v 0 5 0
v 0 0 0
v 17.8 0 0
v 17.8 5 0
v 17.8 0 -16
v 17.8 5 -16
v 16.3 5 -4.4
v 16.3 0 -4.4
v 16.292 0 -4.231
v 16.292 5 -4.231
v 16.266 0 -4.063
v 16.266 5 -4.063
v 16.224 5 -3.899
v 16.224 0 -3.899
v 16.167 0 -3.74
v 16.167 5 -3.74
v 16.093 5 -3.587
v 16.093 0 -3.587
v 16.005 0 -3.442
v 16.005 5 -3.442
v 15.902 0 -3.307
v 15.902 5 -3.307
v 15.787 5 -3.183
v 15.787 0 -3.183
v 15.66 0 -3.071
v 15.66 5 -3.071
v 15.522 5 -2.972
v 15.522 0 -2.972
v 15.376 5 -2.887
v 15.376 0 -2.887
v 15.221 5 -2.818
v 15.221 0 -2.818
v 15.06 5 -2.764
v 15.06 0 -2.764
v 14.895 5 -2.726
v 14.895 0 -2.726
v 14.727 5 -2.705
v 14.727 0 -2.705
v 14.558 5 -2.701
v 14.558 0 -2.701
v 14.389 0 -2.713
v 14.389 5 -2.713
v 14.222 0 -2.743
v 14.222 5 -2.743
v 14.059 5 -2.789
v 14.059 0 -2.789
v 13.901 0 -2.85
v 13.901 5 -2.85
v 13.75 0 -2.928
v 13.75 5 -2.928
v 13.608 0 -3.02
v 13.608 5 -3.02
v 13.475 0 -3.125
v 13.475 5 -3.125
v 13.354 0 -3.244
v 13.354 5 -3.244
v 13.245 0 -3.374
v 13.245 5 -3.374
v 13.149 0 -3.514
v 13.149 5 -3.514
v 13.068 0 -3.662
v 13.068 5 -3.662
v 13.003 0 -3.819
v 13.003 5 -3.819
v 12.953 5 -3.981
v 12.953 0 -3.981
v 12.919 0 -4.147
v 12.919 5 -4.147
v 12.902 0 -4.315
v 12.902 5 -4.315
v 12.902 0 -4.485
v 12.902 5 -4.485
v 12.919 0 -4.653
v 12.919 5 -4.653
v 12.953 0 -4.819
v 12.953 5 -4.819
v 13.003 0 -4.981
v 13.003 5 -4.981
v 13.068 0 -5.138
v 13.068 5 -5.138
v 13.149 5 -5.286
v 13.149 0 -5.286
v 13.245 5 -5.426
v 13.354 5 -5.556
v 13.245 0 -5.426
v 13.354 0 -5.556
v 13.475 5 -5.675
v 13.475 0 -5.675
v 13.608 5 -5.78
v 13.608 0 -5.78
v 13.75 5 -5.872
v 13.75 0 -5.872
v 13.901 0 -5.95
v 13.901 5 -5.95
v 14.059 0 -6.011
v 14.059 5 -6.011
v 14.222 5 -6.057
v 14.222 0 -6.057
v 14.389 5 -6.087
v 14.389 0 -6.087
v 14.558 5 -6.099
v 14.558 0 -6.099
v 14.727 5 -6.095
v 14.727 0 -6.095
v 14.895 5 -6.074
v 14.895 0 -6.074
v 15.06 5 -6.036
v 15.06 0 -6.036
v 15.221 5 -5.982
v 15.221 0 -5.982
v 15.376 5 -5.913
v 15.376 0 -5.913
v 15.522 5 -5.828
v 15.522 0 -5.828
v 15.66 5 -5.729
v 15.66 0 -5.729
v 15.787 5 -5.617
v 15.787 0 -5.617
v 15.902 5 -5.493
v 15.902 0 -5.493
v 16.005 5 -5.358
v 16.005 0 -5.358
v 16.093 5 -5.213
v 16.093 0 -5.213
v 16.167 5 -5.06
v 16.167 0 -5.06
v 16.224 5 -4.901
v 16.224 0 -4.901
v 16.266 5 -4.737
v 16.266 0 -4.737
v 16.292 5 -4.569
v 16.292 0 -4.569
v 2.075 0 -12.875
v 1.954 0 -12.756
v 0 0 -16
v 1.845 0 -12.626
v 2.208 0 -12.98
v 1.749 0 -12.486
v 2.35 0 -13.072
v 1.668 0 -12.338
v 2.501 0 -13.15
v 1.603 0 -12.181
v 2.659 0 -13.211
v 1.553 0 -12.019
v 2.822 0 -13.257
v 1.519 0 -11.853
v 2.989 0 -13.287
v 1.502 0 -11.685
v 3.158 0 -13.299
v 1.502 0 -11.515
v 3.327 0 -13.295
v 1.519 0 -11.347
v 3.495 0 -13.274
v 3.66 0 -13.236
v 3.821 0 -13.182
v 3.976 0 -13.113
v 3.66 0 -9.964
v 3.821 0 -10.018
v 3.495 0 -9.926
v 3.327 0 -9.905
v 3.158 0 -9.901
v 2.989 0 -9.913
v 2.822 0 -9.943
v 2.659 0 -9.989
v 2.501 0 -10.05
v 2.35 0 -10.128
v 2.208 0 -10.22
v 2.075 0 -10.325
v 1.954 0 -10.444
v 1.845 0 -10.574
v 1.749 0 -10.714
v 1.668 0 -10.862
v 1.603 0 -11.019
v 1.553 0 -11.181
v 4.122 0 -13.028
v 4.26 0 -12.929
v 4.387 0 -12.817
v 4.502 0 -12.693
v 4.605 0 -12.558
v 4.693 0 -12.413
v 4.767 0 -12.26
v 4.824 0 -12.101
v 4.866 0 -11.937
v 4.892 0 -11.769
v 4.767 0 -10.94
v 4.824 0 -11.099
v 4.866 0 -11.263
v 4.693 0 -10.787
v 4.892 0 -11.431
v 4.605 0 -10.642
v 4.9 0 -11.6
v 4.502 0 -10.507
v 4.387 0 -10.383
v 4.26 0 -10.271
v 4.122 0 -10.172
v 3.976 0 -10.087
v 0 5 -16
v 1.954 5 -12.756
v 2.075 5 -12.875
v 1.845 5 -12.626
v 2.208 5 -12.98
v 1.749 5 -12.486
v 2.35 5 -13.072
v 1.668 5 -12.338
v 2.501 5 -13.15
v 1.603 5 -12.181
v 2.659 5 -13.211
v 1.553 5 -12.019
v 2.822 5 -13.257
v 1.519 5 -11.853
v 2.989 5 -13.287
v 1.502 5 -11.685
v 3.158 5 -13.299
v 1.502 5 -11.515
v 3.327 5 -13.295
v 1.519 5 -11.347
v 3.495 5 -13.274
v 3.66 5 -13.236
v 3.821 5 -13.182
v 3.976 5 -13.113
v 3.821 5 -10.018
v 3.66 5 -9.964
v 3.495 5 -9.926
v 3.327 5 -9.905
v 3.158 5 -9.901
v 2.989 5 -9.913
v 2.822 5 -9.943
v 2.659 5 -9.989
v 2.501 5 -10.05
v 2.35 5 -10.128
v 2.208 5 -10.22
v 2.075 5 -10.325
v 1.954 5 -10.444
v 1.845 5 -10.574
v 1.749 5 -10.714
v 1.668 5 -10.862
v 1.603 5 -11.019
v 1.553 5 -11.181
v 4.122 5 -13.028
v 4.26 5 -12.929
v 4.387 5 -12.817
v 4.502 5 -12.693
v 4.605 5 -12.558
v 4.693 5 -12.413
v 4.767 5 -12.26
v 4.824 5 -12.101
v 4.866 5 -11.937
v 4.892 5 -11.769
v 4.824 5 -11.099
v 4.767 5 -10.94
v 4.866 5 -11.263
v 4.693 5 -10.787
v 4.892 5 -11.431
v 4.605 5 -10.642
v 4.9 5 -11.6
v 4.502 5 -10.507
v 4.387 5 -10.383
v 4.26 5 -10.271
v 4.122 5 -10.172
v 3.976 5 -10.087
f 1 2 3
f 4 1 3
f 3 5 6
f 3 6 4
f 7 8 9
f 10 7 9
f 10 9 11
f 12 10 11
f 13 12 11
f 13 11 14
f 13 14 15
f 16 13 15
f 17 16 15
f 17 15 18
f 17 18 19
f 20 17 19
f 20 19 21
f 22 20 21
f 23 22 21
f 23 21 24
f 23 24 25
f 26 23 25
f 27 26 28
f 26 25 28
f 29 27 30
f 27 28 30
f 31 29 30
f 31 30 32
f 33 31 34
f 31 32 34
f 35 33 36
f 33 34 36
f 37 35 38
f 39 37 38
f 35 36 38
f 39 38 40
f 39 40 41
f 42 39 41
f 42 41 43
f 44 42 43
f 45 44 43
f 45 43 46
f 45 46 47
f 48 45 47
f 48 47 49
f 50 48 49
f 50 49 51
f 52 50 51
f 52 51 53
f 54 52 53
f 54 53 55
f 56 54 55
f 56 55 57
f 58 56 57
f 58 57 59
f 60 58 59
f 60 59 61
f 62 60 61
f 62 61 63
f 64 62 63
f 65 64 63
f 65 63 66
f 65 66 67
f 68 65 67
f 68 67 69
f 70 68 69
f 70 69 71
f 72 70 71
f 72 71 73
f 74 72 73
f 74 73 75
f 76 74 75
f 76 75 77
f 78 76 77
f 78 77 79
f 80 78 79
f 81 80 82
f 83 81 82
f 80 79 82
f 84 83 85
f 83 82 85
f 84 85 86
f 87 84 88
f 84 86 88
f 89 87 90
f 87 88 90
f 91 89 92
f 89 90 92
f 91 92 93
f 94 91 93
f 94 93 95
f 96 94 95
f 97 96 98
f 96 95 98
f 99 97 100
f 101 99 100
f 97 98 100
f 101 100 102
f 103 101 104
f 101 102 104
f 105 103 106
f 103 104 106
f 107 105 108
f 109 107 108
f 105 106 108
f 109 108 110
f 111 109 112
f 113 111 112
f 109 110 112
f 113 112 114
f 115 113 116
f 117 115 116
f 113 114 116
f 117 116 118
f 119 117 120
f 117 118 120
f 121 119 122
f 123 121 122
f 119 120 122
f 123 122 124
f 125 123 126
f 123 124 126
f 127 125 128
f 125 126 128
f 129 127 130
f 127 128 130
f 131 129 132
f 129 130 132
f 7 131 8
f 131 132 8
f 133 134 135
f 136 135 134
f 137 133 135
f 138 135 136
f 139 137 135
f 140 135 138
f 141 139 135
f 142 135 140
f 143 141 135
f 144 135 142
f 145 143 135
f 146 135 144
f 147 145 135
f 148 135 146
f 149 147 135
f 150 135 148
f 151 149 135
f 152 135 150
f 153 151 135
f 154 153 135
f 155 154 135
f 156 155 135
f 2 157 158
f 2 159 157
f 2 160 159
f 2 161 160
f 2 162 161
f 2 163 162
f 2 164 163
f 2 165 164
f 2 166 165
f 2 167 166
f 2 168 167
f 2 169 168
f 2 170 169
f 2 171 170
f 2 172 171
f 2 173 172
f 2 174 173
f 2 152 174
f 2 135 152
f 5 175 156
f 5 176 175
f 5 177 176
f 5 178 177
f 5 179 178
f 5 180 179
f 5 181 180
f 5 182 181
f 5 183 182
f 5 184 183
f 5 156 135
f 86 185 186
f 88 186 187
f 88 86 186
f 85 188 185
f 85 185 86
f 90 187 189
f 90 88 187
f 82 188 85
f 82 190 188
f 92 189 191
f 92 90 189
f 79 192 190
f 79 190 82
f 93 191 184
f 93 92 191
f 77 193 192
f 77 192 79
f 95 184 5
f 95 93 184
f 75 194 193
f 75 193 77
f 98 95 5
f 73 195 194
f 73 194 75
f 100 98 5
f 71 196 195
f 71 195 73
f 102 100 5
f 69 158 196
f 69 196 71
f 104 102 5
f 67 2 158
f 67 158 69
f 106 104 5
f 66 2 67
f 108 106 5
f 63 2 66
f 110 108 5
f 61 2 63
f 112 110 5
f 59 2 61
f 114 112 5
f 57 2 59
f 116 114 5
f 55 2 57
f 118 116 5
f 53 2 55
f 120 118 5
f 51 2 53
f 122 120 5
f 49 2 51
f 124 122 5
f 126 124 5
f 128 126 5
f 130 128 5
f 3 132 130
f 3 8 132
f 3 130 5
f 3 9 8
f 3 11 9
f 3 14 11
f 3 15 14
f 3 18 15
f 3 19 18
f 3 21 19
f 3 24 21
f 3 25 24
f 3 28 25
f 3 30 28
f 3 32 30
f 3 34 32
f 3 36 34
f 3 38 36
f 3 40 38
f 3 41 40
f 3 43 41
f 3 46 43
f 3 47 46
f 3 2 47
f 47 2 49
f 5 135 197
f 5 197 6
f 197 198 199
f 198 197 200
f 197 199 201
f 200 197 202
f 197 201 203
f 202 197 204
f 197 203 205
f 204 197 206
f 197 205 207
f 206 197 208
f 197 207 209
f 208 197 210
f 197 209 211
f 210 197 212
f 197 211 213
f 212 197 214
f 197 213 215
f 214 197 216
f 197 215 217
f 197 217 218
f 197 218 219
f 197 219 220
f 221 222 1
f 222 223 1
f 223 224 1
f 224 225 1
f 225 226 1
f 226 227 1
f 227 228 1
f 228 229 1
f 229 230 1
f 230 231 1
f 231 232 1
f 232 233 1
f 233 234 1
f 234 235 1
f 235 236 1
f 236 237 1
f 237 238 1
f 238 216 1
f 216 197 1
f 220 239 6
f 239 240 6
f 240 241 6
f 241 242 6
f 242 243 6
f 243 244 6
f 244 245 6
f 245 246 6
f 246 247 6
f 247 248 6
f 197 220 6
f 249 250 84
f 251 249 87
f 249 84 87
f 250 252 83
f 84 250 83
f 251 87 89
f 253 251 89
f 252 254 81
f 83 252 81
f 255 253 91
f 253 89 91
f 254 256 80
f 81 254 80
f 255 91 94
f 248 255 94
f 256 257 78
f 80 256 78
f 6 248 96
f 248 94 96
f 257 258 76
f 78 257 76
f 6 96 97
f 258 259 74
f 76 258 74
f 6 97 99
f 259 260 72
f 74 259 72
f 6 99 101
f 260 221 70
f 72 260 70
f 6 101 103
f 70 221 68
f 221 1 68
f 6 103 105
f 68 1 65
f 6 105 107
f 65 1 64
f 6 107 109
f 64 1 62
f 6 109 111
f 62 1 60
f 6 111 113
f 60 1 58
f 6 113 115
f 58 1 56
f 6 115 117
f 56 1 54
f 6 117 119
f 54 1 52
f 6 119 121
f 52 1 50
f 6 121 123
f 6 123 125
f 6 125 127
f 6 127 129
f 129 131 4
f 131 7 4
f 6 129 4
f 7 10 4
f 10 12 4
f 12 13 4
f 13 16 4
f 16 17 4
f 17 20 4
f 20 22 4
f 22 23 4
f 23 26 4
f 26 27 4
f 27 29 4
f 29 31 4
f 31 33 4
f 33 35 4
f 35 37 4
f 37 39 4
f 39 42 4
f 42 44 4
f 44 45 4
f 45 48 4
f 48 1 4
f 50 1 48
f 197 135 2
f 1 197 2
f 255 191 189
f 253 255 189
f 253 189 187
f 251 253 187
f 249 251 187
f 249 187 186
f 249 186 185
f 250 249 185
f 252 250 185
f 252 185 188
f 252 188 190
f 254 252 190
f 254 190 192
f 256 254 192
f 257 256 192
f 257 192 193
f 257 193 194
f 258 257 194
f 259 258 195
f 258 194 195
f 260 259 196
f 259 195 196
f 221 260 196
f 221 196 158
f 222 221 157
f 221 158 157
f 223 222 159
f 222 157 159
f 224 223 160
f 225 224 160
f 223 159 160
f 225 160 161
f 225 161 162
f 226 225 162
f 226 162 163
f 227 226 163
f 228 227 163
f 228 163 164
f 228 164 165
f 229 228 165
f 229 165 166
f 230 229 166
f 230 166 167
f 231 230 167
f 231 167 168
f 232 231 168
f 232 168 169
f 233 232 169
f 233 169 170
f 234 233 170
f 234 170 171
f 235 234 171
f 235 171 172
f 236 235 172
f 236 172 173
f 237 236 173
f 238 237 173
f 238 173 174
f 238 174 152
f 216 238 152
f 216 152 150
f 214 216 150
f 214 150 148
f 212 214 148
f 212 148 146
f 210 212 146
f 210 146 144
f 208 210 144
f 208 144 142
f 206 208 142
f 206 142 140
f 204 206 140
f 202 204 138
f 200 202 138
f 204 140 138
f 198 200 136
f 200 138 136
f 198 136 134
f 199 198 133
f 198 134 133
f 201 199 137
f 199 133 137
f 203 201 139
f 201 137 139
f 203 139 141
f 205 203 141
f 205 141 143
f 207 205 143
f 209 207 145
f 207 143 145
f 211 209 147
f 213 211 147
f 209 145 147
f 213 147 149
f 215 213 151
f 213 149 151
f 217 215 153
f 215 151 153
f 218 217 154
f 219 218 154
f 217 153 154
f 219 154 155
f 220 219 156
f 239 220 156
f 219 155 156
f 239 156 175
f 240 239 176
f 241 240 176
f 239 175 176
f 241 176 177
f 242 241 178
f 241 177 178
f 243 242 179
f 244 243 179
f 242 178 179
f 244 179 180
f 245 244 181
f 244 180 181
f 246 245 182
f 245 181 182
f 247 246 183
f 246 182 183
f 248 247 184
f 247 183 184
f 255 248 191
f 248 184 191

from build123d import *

# Parameters (mm, degrees)
F0_W     = 17.8
F0_H     = 16
F1_DEPTH = 5
F2_R     = 1.7
F3_DEPTH = 5.001


with BuildPart() as f1:
    # F0 (on Front) → F1 (new body)
    with BuildSketch(Plane.XZ):
        with Locations((8.9, -8)):
            Rectangle(F0_W, F0_H)
    extrude(amount=-F1_DEPTH)

    # F2 (on face) → F3 (cut, through all)
    with BuildSketch(Plane.XZ):
        with Locations((3.2, -11.6)):
            Circle(F2_R)
        with Locations((14.6, -4.4)):
            Circle(F2_R)
    extrude(amount=-F3_DEPTH, mode=Mode.SUBTRACT)


solid = f1.part
